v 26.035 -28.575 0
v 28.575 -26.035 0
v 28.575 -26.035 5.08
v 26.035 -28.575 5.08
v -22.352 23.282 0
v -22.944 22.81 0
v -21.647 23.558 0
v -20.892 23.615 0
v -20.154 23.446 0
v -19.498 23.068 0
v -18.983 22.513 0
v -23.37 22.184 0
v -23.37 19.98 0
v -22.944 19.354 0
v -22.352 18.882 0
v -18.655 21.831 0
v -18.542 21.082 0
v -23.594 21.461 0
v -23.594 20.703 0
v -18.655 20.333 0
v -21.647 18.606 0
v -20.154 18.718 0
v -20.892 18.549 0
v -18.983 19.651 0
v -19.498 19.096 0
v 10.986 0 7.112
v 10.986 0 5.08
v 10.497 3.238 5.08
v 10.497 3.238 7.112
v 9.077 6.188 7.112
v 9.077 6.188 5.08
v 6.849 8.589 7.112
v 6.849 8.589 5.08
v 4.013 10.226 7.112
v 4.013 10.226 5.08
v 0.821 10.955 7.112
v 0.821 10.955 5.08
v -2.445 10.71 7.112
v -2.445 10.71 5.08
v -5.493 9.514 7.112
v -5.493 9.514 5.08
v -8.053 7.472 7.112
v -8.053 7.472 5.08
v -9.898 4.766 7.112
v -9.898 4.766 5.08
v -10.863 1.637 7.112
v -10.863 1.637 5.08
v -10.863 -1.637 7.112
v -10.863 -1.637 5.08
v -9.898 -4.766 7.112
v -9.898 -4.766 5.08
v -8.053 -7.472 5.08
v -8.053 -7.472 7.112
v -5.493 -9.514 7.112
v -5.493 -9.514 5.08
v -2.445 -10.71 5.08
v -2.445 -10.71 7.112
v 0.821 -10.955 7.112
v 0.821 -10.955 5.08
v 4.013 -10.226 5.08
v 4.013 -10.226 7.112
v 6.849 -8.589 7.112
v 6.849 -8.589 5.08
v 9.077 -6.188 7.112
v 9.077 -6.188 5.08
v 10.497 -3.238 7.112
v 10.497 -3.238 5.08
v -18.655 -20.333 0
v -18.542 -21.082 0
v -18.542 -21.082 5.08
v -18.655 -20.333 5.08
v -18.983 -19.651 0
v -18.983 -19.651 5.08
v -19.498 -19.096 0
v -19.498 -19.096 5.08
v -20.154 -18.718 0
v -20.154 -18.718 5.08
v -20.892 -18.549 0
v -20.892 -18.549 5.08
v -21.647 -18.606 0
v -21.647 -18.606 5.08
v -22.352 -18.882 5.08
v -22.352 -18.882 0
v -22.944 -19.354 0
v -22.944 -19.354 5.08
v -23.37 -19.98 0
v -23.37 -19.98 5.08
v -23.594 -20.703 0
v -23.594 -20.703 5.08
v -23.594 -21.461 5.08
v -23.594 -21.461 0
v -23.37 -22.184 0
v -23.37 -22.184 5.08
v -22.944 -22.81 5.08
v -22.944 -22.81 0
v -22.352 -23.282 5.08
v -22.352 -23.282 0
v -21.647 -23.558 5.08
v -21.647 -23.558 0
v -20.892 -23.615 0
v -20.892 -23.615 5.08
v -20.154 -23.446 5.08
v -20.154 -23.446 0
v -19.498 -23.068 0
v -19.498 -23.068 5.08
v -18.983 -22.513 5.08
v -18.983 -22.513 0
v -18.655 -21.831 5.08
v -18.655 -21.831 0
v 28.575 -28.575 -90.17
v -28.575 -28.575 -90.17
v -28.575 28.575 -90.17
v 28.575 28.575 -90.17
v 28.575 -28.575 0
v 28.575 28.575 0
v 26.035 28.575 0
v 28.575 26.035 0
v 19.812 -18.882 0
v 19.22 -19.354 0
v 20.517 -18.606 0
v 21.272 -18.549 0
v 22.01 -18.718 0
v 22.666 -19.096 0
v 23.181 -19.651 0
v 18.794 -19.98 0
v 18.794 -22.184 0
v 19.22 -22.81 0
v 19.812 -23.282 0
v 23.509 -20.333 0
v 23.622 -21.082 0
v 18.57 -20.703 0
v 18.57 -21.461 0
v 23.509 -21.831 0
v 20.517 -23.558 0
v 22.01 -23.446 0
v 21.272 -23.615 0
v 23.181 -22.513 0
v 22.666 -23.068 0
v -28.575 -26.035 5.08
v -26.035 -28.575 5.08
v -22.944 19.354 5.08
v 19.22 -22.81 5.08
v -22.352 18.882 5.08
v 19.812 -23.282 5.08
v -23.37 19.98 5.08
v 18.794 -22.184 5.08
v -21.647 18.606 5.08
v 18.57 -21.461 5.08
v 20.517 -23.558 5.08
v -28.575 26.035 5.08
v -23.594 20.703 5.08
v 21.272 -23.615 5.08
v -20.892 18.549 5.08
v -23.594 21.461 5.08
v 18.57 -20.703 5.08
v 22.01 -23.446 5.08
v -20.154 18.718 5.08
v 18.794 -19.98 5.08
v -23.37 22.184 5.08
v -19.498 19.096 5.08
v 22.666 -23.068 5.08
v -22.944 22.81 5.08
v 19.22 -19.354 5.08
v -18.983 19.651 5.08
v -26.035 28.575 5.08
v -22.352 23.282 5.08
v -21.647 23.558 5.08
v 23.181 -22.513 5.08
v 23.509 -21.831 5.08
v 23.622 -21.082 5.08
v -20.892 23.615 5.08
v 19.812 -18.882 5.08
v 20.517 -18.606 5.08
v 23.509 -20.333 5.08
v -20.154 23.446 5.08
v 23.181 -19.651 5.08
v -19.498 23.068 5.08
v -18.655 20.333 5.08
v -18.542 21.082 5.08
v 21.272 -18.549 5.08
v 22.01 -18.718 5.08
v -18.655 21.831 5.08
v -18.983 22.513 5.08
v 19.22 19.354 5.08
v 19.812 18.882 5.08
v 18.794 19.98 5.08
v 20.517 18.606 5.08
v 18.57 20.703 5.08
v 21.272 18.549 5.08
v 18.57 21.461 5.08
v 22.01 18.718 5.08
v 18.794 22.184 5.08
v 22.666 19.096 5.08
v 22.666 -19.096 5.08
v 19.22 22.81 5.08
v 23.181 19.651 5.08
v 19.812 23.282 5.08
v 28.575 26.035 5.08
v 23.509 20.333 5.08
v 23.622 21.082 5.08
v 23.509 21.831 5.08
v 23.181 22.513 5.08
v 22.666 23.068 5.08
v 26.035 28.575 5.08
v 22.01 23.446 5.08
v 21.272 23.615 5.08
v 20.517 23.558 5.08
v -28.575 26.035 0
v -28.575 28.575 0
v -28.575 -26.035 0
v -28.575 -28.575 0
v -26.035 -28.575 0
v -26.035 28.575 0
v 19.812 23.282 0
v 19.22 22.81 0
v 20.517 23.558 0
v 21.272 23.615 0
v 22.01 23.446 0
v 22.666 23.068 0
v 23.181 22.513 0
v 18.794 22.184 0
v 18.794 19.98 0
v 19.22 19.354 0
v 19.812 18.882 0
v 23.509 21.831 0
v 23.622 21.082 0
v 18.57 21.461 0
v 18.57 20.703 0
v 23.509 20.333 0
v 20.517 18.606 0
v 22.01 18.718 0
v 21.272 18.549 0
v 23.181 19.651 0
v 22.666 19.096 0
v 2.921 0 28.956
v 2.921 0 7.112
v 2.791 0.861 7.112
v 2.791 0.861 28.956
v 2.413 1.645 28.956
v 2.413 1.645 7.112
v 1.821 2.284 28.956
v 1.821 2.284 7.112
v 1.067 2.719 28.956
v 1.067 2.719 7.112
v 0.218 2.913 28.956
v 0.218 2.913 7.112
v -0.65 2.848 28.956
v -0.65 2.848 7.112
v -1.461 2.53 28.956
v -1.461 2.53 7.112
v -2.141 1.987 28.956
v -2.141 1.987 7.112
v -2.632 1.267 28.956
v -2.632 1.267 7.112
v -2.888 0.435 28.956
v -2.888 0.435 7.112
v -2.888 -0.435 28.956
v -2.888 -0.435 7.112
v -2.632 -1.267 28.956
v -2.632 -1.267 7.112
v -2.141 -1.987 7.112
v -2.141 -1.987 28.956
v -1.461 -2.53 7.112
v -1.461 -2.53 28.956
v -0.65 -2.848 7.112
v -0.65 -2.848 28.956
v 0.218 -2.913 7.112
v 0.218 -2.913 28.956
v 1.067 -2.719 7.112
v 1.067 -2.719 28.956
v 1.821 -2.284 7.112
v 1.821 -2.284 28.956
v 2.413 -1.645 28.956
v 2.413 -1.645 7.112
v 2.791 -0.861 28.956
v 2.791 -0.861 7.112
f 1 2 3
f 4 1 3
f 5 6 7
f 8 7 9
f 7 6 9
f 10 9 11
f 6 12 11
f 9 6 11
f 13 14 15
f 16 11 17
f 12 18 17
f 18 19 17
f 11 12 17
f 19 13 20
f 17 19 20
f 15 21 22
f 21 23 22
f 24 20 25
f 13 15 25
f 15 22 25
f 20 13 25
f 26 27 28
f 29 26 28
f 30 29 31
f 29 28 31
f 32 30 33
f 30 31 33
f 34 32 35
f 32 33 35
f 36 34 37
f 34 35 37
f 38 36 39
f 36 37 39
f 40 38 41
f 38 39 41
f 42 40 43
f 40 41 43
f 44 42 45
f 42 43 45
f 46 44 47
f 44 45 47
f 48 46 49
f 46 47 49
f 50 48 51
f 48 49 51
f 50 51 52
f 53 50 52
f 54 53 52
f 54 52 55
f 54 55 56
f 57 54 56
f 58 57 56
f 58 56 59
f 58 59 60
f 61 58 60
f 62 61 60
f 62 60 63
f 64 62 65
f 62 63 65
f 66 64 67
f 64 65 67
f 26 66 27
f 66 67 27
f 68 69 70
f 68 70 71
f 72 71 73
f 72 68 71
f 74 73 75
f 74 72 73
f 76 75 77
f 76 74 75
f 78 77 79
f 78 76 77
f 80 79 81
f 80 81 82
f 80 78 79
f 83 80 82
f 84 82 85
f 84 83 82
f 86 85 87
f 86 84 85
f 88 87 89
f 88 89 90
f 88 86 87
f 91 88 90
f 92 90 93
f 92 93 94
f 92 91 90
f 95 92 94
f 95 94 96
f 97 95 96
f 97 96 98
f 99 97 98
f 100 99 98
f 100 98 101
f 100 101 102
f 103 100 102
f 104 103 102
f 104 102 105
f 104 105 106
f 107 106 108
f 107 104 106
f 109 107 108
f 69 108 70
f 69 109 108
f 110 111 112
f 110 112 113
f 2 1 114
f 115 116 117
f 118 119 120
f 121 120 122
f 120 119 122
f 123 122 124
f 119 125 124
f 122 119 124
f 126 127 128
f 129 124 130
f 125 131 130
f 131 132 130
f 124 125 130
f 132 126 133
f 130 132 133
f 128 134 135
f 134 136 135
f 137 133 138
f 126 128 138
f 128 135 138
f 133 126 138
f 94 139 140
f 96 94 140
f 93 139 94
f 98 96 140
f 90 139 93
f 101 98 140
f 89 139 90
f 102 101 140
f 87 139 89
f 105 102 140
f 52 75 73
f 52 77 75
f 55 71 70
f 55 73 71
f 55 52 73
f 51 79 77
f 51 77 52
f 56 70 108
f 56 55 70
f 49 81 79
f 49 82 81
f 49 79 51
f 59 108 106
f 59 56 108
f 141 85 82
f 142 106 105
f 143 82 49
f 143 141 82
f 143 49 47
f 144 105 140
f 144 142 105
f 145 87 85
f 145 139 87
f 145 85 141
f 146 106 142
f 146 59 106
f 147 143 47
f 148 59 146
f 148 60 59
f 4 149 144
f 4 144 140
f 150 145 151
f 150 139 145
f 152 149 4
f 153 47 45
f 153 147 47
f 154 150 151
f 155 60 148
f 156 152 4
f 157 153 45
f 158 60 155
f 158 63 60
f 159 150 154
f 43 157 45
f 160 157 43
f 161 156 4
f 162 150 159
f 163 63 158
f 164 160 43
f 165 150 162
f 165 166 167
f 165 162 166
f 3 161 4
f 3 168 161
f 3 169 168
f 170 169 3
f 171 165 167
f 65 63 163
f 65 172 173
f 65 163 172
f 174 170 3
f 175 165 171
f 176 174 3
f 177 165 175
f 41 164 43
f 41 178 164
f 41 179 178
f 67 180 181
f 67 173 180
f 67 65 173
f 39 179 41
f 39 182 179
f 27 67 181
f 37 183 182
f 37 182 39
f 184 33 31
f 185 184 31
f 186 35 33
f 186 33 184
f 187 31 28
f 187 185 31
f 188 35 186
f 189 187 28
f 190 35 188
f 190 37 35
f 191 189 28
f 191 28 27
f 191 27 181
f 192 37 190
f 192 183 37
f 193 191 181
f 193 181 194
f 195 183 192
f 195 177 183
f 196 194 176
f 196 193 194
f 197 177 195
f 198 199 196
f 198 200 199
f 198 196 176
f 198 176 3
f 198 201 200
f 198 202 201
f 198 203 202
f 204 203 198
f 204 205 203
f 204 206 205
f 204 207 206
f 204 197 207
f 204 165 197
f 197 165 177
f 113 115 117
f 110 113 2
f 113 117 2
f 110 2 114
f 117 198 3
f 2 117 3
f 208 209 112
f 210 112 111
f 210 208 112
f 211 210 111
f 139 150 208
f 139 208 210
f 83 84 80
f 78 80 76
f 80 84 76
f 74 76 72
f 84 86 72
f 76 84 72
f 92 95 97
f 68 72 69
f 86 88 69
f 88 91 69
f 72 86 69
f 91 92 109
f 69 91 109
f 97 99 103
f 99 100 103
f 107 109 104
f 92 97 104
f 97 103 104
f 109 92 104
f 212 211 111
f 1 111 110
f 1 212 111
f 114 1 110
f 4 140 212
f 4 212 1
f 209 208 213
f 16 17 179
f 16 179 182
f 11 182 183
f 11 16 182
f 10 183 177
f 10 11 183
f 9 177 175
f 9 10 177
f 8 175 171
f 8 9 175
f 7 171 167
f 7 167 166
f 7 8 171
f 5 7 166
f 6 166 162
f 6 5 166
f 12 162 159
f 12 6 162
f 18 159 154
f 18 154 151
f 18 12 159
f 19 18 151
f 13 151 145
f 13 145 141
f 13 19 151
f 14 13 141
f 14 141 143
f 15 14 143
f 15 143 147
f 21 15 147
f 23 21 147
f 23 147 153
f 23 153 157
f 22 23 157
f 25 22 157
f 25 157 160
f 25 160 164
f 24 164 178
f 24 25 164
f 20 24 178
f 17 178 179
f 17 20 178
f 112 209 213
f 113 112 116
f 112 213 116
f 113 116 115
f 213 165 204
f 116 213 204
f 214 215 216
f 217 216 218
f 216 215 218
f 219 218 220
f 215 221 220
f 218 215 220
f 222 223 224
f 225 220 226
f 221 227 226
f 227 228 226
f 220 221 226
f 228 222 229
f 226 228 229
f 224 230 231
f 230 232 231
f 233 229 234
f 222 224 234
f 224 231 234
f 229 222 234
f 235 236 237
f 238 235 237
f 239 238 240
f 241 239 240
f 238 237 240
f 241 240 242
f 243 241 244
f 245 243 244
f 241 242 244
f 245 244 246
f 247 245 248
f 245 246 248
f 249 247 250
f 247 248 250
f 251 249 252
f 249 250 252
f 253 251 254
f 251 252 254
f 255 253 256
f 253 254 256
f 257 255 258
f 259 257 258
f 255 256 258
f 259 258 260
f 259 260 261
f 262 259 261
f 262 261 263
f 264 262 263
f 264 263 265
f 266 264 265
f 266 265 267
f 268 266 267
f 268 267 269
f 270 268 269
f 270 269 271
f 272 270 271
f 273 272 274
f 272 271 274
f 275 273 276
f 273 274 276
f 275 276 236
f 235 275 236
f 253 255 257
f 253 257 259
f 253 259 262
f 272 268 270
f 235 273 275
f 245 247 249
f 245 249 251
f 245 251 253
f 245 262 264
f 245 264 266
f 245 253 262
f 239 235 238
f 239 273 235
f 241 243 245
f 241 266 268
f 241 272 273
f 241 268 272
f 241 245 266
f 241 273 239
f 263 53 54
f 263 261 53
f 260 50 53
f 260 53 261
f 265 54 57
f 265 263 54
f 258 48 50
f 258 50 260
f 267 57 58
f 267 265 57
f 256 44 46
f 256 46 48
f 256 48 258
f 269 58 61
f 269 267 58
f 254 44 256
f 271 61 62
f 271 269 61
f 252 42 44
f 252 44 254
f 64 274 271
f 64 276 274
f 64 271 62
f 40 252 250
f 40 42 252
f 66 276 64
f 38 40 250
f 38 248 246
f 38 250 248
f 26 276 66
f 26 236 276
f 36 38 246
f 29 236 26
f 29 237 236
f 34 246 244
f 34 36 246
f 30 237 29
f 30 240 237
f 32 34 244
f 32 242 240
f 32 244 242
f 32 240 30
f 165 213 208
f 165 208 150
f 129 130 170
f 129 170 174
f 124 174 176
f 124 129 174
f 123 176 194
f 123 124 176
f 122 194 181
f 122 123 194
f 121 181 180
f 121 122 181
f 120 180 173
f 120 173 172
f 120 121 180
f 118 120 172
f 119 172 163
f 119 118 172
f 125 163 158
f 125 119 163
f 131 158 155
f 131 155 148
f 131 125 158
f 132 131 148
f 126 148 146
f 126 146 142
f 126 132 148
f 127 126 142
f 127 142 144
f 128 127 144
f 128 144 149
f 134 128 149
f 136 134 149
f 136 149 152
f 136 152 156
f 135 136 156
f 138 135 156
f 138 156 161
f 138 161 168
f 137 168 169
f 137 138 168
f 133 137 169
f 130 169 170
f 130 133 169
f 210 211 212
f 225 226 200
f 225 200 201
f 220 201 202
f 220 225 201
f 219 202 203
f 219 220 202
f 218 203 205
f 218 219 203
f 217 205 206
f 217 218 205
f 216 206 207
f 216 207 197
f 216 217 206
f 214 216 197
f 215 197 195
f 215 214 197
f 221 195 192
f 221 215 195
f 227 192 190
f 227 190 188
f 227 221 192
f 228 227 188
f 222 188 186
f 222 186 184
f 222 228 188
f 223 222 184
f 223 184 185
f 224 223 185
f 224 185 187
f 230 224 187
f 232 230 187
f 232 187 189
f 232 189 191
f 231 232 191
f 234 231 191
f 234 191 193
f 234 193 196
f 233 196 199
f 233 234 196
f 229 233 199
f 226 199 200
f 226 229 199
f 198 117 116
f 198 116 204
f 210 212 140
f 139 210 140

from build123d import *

# Parameters (mm, degrees)
F0_W     = 57.15
F0_H     = 57.15
F0_R     = 2.54
F1_DEPTH = 5.08
F2_SIZE  = 2.54
F3_W     = 57.15
F3_H     = 57.15
F4_DEPTH = 90.17
F5_R     = 10.9855
F6_DEPTH = 2.032
F7_R     = 2.921
F8_DEPTH = 21.844


with BuildPart() as f1:
    # F0 (on Top) → F1 (new body)
    with BuildSketch(Plane.XY):
        Rectangle(F0_W, F0_H)
        with Locations((-21.082, -21.082)):
            Circle(F0_R, mode=Mode.SUBTRACT)
        with Locations((21.082, -21.082)):
            Circle(F0_R, mode=Mode.SUBTRACT)
        with Locations((-21.082, 21.082)):
            Circle(F0_R, mode=Mode.SUBTRACT)
        with Locations((21.082, 21.082)):
            Circle(F0_R, mode=Mode.SUBTRACT)
    extrude(amount=F1_DEPTH)

    # F2
    f2_edges = [f1.edges().sort_by_distance(p)[0] for p in [
        (-28.575, 28.575, 2.54),
        (28.575, 28.575, 2.54),
        (28.575, -28.575, 2.54),
        (-28.575, -28.575, 2.54),
    ]]
    chamfer(f2_edges, length=F2_SIZE)

    # F3 (on face) → F4 (join)
    with BuildSketch(Plane(origin=(0, 0, 0), x_dir=(1, 0, 0), z_dir=(0, 0, -1))):
        Rectangle(F3_W, F3_H)
    extrude(amount=F4_DEPTH)

    # F5 (on face) → F6 (join)
    with BuildSketch(Plane.XY.offset(5.08)):
        Circle(F5_R)
    extrude(amount=F6_DEPTH)

    # F7 (on face) → F8 (join)
    with BuildSketch(Plane.XY.offset(7.112)):
        Circle(F7_R)
    extrude(amount=F8_DEPTH)


solid = f1.part
